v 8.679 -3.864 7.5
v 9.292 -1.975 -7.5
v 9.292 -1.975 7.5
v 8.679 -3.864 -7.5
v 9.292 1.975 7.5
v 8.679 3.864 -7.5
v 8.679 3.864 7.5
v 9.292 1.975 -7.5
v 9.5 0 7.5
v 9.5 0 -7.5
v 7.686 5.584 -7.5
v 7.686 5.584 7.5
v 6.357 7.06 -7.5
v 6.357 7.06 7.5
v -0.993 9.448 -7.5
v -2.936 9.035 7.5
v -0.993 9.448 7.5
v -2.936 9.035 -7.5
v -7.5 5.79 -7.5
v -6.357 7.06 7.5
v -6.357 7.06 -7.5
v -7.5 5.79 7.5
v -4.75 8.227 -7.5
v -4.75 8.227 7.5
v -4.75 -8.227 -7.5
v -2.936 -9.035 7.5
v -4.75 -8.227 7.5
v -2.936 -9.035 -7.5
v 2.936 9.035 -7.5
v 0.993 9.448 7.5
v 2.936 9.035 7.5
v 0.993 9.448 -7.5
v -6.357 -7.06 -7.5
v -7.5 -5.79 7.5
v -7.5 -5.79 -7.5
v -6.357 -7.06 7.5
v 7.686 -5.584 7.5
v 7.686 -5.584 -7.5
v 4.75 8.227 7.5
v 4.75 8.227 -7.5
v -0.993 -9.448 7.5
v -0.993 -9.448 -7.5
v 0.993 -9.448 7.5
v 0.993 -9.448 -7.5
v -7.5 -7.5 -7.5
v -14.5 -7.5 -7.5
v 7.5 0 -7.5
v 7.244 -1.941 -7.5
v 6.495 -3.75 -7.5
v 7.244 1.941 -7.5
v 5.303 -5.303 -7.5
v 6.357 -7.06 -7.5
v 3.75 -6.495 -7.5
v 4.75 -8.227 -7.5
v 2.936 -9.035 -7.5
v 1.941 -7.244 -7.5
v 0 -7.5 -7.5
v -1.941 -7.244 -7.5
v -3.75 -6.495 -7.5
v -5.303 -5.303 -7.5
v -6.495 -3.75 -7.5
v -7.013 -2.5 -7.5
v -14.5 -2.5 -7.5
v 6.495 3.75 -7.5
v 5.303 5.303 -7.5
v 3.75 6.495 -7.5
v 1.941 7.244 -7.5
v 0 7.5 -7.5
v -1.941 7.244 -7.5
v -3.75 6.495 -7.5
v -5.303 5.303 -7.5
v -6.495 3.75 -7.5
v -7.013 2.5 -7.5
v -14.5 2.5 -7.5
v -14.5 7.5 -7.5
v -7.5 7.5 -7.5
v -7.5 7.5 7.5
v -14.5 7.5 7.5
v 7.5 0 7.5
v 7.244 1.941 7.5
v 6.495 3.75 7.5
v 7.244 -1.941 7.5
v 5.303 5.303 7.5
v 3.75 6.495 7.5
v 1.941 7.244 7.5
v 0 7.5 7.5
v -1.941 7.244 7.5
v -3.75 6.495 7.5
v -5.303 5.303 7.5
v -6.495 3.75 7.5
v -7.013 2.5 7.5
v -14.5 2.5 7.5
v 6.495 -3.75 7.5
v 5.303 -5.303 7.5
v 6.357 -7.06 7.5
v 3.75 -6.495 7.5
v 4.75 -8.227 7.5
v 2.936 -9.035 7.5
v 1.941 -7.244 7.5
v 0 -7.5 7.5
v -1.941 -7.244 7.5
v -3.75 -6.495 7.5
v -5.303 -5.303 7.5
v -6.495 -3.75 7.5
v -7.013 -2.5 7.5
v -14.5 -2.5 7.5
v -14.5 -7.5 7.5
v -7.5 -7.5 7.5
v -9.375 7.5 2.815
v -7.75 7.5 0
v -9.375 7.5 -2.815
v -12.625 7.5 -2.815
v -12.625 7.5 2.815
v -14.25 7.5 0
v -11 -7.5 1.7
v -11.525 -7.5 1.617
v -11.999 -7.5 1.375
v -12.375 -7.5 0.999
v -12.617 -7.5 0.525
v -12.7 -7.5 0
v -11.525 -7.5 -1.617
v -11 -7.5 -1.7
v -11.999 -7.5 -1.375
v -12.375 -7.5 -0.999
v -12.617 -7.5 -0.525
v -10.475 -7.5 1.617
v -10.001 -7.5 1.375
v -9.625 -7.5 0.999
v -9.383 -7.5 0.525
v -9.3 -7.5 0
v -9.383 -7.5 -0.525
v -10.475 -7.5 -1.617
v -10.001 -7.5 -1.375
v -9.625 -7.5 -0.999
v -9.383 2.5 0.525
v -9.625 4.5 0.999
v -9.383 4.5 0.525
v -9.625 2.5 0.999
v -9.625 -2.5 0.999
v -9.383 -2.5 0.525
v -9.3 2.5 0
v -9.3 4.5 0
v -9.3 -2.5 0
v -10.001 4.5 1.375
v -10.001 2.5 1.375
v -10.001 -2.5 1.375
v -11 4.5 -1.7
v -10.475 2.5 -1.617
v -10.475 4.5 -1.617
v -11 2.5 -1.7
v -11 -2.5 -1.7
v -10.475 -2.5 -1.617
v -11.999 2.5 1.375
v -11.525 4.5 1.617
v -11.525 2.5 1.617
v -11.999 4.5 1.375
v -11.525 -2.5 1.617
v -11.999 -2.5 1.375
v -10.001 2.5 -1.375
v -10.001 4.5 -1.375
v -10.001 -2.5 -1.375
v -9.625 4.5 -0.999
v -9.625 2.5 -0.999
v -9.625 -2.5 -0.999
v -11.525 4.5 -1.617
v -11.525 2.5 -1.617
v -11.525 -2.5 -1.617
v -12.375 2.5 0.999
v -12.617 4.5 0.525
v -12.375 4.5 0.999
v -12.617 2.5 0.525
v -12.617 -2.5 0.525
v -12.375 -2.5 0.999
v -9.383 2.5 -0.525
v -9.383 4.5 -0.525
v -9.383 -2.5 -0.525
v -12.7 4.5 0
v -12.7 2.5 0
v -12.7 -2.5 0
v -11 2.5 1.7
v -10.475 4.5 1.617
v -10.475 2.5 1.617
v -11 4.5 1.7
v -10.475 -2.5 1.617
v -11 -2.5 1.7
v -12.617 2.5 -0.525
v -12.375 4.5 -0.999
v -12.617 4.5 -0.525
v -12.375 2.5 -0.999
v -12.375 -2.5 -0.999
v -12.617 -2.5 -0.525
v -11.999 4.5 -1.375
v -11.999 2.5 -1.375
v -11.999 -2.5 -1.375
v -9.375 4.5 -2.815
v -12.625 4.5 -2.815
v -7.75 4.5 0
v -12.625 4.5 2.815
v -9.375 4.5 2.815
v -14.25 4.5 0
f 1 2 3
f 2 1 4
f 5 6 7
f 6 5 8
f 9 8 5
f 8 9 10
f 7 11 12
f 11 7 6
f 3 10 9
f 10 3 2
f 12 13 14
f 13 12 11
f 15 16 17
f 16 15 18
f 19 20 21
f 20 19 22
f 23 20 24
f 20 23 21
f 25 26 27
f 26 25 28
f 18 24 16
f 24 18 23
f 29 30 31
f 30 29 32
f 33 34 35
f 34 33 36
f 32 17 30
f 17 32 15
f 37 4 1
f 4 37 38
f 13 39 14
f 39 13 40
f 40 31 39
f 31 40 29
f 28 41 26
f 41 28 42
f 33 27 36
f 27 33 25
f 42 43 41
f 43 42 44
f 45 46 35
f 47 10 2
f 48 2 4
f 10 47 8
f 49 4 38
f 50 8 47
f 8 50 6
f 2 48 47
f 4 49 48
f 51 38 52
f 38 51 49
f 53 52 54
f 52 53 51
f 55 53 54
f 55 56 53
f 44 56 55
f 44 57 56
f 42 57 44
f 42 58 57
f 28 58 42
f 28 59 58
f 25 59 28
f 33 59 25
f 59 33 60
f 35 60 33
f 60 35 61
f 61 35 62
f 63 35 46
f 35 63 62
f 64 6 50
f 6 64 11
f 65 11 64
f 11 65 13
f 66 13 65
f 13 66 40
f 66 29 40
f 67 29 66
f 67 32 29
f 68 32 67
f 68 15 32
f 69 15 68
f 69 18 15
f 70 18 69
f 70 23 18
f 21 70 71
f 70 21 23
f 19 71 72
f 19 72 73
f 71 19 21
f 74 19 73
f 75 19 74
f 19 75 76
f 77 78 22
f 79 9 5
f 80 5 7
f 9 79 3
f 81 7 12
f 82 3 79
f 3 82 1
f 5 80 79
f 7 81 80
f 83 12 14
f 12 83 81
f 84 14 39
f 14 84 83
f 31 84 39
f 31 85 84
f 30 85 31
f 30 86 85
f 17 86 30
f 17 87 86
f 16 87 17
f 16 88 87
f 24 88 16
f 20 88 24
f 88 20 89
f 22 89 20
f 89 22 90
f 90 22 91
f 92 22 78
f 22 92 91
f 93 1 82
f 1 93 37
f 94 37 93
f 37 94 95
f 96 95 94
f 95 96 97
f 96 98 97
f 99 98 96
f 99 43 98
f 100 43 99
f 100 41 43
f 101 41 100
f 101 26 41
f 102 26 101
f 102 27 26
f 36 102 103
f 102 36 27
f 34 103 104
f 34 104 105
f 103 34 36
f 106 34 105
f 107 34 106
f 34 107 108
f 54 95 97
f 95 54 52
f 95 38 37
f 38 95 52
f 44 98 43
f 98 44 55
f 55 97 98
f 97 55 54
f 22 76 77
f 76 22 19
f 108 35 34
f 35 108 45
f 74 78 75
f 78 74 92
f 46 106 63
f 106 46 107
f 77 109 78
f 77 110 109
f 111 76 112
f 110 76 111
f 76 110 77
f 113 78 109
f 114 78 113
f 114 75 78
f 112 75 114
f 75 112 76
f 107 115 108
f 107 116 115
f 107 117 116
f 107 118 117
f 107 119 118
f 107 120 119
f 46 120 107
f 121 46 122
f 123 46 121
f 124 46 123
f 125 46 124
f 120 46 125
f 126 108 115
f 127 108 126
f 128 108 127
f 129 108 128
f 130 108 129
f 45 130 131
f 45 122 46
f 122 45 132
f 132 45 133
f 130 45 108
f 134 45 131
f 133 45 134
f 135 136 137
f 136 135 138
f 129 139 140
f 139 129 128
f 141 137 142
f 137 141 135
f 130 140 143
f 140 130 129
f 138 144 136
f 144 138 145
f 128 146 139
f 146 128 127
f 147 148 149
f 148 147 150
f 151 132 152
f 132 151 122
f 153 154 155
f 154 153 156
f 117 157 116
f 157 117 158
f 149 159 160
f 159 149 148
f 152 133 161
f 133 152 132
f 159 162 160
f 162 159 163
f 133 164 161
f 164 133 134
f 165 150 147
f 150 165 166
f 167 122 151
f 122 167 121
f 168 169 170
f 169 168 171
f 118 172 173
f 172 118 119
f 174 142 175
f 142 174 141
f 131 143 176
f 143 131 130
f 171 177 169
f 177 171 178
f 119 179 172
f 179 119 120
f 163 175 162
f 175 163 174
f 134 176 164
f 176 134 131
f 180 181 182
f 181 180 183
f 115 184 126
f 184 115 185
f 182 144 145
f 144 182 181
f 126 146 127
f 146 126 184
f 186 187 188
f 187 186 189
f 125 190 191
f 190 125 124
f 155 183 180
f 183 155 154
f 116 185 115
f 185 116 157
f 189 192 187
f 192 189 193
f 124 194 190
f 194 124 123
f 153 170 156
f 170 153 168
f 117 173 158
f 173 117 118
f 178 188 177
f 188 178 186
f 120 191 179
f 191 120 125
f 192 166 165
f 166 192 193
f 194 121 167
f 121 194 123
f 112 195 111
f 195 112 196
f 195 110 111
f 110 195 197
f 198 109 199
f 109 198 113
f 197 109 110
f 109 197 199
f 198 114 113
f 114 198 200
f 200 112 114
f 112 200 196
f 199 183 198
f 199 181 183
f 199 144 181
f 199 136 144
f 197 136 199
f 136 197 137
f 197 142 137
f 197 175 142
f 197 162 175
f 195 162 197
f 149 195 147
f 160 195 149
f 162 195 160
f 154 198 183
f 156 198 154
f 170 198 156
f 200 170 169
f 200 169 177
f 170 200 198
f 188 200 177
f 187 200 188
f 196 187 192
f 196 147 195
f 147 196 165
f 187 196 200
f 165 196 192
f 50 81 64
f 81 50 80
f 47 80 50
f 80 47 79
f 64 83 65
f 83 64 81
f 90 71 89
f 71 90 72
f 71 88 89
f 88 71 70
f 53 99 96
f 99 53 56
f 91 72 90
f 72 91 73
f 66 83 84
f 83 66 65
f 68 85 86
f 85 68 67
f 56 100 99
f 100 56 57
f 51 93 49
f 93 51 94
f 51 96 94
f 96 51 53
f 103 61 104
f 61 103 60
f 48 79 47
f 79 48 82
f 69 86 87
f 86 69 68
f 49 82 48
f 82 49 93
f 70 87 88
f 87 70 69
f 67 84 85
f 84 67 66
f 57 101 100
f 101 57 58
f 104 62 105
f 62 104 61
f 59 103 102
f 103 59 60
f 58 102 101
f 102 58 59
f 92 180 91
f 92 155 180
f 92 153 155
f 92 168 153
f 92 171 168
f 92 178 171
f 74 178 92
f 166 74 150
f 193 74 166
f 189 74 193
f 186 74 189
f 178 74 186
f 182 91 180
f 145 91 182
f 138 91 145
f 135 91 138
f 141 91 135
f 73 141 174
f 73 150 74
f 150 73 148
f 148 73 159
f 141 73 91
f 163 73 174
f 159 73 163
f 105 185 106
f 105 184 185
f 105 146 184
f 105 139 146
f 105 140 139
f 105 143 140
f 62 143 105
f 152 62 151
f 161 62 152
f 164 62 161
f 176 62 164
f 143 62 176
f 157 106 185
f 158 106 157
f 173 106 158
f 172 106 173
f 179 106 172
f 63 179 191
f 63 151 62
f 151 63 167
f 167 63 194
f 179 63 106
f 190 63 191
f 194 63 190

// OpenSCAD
// Enable / disable clamp base
base = "no"; // [yes, no]

// Thickness of clamp base if enabled
base_thickness = 2;

// Width of clamp base if enabled
base_width = 20;

// Tickness of clamp ring
ring_thickness = 2;

// Inner diameter of clamp ring
ring_inner_dia = 15;

// Thickness of clamp jaws
jaws_thickness = 5;

// Width of clamp jaws
jaws_width = 7;

// Width of break in clamp jaws
break_width = 5;

// Screw hole diameter
screw_diameter = 3.4;

// Screw hole count
screw_count = 1;

// Enable / disable nut recess in clamp
nut_recess = "yes"; // [yes, no]

// Nut recess diameter
nut_diameter = 6.5;

// Nut recess depth
nut_thickness = 3;

// Clamp height
height = 15;

// preview[view:north west, tilt:top diagonal]

translate([0, 0, 0]) clamp();

module clamp() {

	//Check base thickness
	if(base && base_thickness < ring_thickness)
		echo("Base thickness must be at least ring thickness, ring will protrude through base");

	//Check jaws width
	if(jaws_width < ring_thickness)
		echo("Jaw width must be at least ring thickness, ring will protrude through jaws");

	//Calculate ring inner radius
	ring_inner_rad = ring_inner_dia / 2;

	//Calculate screw spacing
	screw_spacing = (height - (screw_diameter * screw_count)) / (screw_count + 1);

	//Base
	if(base == "yes")
		translate([ring_inner_rad + (base_thickness / 2), 0, 0])
			cube([base_thickness, base_width, height], center=true);

	//Clamp
	difference() {
		union() {
			//Outer cylinder
			cylinder(r=ring_inner_rad + ring_thickness, h=height, center=true);

			//Jaws
			translate([0 - ring_inner_rad - (jaws_width / 2), 0, 0])
				cube([jaws_width, (jaws_thickness * 2) + break_width, height], center=true);
		}
	
		//Inner cylinder
		cylinder(r=ring_inner_rad, h=height + 10, center=true);

		//Break
		translate([0 - ((jaws_width + ring_thickness + (ring_inner_dia / 2) + 10) / 2), 0, 0])
			cube([jaws_width + ring_thickness + (ring_inner_dia / 2) + 10, break_width, height + 10], center=true);

		//Screw hole(s)
		for(i = [1 : screw_count])
			translate([0 - (ring_inner_dia / 2) - (jaws_width / 2), 0, (height / 2) - (screw_diameter / 2) - (screw_spacing * i) - (screw_diameter * (i - 1))])
				rotate([90, 0, 0])
					union() {
						cylinder(r=screw_diameter / 2, h=jaws_thickness * 2 + break_width + 10, center=true, $fn=20);
						if(nut_recess == "yes") translate([0, 0, nut_thickness-((nut_thickness + 10)/2)-(break_width/2)-jaws_thickness]) cylinder(r=nut_diameter/2, h=nut_thickness + 10, center=true, $fn=6);
					}
	}
}
